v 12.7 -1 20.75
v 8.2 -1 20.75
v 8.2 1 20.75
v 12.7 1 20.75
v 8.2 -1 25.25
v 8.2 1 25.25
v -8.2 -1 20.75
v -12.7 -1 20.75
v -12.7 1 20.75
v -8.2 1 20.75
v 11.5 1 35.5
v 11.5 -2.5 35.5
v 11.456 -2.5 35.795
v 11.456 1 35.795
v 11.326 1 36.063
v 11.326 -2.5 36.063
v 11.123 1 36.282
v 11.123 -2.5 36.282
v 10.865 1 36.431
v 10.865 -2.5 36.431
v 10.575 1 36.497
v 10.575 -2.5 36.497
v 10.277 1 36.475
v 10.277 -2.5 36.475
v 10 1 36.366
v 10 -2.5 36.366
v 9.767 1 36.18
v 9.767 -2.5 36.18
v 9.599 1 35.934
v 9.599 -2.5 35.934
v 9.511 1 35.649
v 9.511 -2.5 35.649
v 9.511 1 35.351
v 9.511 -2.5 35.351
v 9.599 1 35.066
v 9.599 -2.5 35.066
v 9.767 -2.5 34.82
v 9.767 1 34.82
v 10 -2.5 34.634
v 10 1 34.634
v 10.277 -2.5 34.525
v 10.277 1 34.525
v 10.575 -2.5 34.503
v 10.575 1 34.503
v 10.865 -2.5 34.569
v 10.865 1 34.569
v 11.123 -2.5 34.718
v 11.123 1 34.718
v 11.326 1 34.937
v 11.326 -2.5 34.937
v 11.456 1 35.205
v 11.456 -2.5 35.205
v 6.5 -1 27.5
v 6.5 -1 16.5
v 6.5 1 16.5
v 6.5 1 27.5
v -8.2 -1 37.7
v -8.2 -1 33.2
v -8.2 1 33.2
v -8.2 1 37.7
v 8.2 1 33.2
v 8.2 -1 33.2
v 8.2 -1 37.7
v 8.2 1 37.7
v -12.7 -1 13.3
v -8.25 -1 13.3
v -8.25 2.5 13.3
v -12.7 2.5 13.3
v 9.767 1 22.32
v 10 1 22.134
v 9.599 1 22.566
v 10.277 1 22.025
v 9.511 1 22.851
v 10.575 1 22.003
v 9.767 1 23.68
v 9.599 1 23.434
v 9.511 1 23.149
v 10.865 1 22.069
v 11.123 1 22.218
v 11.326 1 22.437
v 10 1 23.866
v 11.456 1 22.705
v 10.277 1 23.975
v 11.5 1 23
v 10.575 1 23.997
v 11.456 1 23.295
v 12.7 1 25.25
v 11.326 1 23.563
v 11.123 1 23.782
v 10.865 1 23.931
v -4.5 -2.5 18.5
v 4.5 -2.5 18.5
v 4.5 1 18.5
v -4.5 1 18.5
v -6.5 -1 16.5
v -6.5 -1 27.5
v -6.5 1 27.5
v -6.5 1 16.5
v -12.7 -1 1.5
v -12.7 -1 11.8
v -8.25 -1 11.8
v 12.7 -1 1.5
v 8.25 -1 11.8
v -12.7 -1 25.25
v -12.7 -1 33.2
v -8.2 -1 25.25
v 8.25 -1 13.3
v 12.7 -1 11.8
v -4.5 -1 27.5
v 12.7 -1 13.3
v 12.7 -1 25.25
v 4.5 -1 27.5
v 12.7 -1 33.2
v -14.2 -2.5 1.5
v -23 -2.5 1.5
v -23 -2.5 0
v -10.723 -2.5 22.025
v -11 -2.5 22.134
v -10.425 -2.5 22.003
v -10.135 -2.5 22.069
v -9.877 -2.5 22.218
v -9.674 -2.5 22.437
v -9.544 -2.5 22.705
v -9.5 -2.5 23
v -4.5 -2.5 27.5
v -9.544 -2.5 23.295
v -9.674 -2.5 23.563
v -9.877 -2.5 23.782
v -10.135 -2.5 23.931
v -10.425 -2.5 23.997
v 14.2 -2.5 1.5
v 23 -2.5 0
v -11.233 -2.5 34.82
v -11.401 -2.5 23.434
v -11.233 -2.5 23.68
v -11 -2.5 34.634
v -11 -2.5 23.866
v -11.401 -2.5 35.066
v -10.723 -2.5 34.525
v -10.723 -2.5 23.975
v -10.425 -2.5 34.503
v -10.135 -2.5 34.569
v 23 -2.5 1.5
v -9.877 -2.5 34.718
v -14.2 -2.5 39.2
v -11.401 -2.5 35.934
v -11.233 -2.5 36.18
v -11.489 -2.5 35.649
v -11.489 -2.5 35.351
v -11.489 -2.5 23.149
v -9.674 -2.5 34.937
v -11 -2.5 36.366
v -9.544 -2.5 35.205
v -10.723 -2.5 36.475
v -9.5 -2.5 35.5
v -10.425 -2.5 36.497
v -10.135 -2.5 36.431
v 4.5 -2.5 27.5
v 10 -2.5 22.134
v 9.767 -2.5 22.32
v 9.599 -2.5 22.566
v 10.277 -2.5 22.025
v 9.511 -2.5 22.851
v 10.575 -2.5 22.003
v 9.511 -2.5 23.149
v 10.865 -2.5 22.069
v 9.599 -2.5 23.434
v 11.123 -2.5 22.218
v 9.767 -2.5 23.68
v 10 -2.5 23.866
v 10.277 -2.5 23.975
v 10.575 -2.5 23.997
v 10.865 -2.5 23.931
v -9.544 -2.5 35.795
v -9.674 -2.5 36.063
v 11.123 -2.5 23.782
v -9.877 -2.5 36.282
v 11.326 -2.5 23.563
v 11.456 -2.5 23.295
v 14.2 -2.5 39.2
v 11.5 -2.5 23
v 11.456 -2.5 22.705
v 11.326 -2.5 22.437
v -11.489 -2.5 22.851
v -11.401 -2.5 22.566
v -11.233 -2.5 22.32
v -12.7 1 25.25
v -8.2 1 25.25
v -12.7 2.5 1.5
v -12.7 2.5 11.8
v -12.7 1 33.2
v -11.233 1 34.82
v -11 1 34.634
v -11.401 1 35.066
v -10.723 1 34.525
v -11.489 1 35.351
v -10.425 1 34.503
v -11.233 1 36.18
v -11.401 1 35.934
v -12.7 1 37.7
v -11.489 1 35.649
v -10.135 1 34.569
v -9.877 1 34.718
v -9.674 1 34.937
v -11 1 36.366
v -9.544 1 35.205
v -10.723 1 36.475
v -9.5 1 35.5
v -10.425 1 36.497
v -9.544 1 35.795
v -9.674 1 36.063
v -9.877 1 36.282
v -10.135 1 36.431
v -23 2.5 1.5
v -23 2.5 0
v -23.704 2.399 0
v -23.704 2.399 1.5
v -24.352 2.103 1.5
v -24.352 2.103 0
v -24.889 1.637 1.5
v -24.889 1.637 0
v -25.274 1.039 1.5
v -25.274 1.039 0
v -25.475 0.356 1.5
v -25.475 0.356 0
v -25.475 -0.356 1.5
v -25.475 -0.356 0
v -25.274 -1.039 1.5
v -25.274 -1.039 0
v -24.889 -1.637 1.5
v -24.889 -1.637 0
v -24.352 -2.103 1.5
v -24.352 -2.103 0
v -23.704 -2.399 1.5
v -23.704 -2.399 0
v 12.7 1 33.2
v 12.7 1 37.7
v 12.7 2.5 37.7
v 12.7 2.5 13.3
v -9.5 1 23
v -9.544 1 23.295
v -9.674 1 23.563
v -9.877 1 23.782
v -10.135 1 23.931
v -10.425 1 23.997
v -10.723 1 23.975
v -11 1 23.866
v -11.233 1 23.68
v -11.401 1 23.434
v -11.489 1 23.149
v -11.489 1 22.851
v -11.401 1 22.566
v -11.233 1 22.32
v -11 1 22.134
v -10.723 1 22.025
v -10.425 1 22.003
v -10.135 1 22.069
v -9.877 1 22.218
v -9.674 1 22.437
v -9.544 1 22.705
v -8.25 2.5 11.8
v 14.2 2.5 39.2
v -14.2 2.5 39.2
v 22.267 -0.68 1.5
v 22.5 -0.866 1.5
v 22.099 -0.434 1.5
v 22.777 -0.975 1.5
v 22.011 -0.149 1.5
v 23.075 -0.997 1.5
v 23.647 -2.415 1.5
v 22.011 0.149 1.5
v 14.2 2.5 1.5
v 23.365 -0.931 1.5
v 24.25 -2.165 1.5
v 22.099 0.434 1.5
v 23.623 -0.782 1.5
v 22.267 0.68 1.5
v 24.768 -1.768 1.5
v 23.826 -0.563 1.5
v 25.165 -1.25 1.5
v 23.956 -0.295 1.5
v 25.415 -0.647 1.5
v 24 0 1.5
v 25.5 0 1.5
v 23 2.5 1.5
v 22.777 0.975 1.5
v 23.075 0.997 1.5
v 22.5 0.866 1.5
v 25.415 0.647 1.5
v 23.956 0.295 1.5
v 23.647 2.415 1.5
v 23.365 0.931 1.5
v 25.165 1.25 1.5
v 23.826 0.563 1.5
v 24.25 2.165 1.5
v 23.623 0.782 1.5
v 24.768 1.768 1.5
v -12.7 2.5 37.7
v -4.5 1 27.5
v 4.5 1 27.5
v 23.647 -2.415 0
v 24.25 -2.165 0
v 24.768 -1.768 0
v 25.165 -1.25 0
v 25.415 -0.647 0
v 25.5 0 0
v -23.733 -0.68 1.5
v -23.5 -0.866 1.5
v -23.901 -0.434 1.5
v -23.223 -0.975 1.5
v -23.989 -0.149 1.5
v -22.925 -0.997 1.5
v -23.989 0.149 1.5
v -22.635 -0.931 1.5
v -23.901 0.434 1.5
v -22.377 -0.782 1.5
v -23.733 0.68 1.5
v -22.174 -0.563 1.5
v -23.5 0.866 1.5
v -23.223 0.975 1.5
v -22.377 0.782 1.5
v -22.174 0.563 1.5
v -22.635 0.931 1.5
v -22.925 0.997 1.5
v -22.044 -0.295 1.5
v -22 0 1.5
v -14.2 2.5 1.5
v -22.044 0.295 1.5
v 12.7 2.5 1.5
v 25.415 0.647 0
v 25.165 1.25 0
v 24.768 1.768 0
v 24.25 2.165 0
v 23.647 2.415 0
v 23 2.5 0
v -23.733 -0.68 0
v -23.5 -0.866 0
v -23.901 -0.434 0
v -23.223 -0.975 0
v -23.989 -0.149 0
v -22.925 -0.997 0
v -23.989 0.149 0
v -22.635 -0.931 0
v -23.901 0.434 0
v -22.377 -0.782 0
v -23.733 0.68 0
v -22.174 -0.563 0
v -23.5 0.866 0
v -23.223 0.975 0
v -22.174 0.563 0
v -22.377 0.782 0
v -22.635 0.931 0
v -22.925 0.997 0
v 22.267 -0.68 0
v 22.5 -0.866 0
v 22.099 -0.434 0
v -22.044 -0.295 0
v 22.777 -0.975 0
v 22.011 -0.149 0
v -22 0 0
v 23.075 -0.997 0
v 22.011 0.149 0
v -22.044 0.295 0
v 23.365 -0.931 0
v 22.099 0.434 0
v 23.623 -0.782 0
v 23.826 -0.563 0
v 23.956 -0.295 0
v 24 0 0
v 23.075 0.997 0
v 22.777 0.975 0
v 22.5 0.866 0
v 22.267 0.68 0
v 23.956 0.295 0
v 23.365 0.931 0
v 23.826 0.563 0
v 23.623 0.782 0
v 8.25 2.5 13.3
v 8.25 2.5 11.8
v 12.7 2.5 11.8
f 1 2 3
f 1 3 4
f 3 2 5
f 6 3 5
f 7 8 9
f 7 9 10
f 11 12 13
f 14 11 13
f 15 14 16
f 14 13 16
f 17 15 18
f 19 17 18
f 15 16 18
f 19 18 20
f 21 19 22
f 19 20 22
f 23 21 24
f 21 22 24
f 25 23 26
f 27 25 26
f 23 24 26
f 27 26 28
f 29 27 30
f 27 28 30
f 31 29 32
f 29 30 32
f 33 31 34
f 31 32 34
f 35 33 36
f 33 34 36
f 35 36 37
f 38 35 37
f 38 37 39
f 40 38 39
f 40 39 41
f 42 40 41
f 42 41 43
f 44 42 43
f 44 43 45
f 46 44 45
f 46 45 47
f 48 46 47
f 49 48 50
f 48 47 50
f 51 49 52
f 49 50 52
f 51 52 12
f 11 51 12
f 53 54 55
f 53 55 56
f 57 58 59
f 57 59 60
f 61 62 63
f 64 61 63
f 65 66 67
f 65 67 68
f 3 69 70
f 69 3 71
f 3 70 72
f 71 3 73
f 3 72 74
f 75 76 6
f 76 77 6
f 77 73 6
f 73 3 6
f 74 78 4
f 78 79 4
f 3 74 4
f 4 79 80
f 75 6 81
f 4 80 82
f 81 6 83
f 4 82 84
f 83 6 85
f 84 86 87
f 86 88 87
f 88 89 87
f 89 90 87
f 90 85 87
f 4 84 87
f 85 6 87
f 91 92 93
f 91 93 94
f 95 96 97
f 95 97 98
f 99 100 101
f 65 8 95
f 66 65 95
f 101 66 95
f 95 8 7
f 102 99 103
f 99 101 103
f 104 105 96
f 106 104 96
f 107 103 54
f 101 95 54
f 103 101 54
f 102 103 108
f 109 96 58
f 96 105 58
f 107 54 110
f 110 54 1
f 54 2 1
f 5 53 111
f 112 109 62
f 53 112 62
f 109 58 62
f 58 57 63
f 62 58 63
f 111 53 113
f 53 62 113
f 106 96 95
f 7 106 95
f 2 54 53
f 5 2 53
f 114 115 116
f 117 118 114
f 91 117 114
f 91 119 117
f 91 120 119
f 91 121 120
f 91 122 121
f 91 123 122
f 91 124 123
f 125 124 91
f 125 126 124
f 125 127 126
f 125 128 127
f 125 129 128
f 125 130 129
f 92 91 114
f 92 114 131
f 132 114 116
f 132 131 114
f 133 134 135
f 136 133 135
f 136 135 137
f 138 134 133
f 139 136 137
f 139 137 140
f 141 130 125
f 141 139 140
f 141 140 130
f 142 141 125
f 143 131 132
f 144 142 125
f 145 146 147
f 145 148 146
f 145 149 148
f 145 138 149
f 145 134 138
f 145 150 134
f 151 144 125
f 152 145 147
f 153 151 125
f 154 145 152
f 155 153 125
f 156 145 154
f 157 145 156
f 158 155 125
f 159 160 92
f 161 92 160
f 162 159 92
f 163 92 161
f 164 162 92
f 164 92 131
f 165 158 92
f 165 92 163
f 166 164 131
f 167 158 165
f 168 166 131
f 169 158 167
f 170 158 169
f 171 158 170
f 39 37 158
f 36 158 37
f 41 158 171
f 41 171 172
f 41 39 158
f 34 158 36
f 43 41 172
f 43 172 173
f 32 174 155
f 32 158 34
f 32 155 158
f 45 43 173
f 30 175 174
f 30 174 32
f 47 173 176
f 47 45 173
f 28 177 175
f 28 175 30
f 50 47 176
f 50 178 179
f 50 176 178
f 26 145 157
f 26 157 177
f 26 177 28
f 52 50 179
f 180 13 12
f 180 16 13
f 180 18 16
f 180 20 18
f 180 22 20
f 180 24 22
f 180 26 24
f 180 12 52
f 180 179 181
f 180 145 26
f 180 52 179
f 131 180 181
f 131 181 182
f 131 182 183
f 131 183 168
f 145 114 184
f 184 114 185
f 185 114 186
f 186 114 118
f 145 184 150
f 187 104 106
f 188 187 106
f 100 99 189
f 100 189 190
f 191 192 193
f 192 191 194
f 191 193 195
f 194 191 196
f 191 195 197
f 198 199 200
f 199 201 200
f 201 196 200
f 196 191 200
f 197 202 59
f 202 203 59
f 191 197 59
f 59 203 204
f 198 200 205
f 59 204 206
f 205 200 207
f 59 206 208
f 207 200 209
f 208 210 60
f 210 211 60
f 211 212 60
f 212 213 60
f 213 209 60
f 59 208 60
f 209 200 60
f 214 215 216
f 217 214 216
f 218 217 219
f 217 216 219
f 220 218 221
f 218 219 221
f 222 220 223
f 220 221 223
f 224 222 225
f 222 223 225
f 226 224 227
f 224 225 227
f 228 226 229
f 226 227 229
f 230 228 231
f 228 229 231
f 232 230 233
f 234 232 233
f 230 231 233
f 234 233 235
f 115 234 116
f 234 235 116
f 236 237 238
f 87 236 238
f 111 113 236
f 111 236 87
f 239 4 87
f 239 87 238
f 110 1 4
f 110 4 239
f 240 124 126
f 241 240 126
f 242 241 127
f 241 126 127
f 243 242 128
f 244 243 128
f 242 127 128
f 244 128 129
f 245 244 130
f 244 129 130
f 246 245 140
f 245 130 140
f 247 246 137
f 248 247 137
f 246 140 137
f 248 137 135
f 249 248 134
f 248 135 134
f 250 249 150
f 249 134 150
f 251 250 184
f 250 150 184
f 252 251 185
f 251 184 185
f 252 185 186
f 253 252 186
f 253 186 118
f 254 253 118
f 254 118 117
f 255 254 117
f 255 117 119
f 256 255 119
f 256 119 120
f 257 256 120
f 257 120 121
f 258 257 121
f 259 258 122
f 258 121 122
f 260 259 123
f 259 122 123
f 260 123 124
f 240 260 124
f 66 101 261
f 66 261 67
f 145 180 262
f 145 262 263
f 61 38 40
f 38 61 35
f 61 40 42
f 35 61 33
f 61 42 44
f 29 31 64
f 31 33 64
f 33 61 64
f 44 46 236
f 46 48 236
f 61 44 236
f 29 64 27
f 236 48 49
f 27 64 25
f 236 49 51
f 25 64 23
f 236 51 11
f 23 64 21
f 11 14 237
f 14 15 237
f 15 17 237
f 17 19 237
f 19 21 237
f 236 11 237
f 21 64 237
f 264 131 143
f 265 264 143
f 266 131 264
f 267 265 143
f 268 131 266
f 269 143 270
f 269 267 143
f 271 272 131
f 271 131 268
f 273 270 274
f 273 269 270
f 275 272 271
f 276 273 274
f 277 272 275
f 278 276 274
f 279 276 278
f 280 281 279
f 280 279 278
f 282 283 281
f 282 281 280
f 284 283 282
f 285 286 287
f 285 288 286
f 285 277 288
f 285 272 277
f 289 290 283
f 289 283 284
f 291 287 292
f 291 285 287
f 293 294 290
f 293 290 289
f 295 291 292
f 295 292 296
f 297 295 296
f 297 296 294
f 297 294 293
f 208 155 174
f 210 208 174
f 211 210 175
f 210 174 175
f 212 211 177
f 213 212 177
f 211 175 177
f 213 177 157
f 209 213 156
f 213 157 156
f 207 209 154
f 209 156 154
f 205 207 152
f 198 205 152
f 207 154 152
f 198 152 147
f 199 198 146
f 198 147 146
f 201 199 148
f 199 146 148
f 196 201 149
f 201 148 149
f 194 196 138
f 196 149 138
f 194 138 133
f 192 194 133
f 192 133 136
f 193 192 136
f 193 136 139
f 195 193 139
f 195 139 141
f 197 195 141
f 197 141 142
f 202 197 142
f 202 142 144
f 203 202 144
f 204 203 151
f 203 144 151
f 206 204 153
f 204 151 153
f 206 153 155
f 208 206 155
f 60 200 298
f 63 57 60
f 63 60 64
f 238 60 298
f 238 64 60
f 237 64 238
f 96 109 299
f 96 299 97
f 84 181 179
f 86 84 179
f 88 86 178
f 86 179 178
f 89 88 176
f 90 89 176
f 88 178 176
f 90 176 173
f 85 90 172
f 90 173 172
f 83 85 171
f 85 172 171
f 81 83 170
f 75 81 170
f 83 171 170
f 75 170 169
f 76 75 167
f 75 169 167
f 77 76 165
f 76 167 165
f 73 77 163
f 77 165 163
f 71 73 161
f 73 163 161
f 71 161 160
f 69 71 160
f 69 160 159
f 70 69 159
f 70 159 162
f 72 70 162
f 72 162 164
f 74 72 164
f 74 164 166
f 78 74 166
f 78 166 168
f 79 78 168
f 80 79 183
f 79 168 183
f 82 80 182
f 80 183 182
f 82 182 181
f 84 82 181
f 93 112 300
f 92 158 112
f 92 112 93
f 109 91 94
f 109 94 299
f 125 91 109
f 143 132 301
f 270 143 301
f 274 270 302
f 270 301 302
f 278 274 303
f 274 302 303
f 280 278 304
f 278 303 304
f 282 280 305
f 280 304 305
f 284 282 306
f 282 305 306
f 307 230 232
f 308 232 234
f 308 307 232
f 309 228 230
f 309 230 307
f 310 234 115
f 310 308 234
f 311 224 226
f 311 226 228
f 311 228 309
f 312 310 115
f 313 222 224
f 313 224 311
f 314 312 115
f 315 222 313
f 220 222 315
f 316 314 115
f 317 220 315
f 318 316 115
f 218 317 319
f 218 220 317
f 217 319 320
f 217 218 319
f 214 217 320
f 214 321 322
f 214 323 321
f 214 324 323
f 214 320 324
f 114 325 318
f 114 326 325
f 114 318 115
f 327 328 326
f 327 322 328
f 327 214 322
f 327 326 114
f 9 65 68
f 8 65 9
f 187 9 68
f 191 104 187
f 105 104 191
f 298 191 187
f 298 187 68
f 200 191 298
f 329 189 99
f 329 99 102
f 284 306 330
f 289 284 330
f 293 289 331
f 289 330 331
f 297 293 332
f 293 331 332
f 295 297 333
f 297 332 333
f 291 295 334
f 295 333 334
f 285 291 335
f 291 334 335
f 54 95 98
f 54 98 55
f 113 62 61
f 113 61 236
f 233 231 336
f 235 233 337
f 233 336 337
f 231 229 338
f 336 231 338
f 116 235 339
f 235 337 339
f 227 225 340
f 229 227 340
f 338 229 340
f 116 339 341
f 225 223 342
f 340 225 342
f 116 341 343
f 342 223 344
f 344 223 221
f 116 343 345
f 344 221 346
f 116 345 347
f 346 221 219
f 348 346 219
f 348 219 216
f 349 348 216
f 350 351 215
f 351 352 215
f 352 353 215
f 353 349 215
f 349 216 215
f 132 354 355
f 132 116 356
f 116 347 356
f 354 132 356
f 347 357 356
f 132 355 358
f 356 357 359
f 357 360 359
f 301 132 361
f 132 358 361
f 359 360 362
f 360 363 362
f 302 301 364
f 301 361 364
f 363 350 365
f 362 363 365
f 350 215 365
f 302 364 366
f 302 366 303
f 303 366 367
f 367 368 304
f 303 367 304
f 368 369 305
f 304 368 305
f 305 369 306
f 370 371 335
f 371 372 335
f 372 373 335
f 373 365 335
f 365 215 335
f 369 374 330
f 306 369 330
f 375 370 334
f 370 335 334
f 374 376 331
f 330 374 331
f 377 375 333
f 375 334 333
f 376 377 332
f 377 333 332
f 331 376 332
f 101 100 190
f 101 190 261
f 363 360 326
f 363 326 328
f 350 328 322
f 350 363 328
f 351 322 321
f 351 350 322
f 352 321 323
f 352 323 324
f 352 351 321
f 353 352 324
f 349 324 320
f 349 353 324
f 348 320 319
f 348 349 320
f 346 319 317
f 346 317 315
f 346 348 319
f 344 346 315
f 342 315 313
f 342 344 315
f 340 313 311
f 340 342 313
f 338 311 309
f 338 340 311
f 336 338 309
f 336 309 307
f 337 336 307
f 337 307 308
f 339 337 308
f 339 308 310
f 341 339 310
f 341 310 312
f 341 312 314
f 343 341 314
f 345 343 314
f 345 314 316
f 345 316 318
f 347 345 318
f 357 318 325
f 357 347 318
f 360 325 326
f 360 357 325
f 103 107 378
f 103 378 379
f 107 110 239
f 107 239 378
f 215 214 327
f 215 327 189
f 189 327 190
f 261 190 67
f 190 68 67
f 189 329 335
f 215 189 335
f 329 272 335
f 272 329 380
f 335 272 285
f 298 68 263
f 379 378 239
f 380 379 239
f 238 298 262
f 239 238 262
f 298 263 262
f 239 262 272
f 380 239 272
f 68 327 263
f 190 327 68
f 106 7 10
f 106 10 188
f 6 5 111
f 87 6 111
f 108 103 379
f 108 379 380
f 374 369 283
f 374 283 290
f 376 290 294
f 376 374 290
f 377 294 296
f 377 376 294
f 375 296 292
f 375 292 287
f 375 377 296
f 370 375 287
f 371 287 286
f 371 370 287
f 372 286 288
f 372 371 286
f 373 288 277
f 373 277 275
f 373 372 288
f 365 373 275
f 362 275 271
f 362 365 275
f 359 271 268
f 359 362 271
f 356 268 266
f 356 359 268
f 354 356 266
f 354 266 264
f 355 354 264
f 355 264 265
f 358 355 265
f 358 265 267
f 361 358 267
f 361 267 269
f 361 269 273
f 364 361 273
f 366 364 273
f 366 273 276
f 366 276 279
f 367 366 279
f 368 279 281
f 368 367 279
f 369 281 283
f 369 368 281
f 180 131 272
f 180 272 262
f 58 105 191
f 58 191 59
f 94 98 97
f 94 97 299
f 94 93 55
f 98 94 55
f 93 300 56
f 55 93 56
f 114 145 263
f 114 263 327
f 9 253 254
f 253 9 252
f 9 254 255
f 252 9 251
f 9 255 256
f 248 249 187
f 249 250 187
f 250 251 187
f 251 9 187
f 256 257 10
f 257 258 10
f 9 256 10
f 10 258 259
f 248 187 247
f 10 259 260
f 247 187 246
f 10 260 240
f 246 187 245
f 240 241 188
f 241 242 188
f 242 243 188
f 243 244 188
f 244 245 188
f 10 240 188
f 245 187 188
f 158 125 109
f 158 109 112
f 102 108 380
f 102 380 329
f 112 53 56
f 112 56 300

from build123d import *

# Parameters (mm, degrees)
F0_R     = 1
F1_DEPTH = 1.5
F3_DEPTH = 1.5
F4_DEPTH = 5
F2_W     = 4.5
F2_H     = 4.5
F2_R     = 1
F5_DEPTH = 3.5


with BuildPart() as f1:
    # F0 (on Top) → F1 (new body)
    with BuildSketch(Plane.XY):
        with BuildLine():
            ThreePointArc((-20.5, 0), (-21.232233047, 1.767766953), (-23, 2.5))
            ThreePointArc((-23, 2.5), (-25.5, 0), (-23, -2.5))
            ThreePointArc((-23, -2.5), (-21.232233047, -1.767766953), (-20.5, 0))
        make_face()
        with Locations((-23, 0)):
            Circle(F0_R, mode=Mode.SUBTRACT)
        with BuildLine():
            Line((23, 2.5), (-23, 2.5))
            ThreePointArc((-23, 2.5), (-21.232233047, 1.767766953), (-20.5, 0))
            ThreePointArc((-20.5, 0), (-21.232233047, -1.767766953), (-23, -2.5))
            Line((-23, -2.5), (23, -2.5))
            ThreePointArc((23, -2.5), (20.5, 0), (23, 2.5))
        make_face()
        with BuildLine():
            ThreePointArc((25.5, 0), (24.767766953, 1.767766953), (23, 2.5))
            ThreePointArc((23, 2.5), (20.5, 0), (23, -2.5))
            ThreePointArc((23, -2.5), (24.767766953, -1.767766953), (25.5, 0))
        make_face()
        with Locations((23, 0)):
            Circle(F0_R, mode=Mode.SUBTRACT)
    extrude(amount=F1_DEPTH)

    # F2 (on face) → F3 (join)
    with BuildSketch(Plane.XZ.offset(2.5)):
        Polygon((8.2, 37.7), (-8.2, 37.7), (-8.2, 33.2), (-12.7, 33.2), (-12.7, 25.25), (-8.2, 25.25), (-8.2, 20.75), (-12.7, 20.75), (-12.7, 13.3), (-8.25, 13.3), (-8.25, 11.8), (-12.7, 11.8), (-12.7, 1.5), (12.7, 1.5), (12.7, 11.8), (8.25, 11.8), (8.25, 13.3), (12.7, 13.3), (12.7, 20.75), (8.2, 20.75), (8.2, 25.25), (12.7, 25.25), (12.7, 33.2), (8.2, 33.2), align=None)
        Polygon((-6.5, 27.5), (-4.5, 27.5), (4.5, 27.5), (6.5, 27.5), (6.5, 16.5), (-6.5, 16.5), align=None, mode=Mode.SUBTRACT)
    extrude(amount=-F3_DEPTH)

    # F2 (on face) → F4 (join)
    with BuildSketch(Plane.XZ.offset(2.5)):
        Polygon((-12.7, 33.2), (-12.7, 37.7), (-8.2, 37.7), (8.2, 37.7), (12.7, 37.7), (12.7, 33.2), (12.7, 25.25), (12.7, 20.75), (12.7, 13.3), (8.25, 13.3), (8.25, 11.8), (12.7, 11.8), (12.7, 1.5), (14.2, 1.5), (14.2, 39.2), (-14.2, 39.2), (-14.2, 1.5), (-12.7, 1.5), (-12.7, 11.8), (-8.25, 11.8), (-8.25, 13.3), (-12.7, 13.3), (-12.7, 20.75), (-12.7, 25.25), align=None)
    extrude(amount=-F4_DEPTH)

    # F2 (on face) → F5 (join)
    with BuildSketch(Plane.XZ.offset(2.5)):
        with Locations((10.45, 35.45)):
            Rectangle(F2_W, F2_H)
        with Locations((10.5, 35.5)):
            Circle(F2_R, mode=Mode.SUBTRACT)
        with Locations((10.45, 23)):
            Rectangle(F2_W, F2_H)
        with Locations((10.5, 23)):
            Circle(F2_R, mode=Mode.SUBTRACT)
        Polygon((-4.5, 18.5), (-4.5, 27.5), (-6.5, 27.5), (-6.5, 16.5), (6.5, 16.5), (6.5, 27.5), (4.5, 27.5), (4.5, 18.5), align=None)
        with Locations((-10.45, 35.45)):
            Rectangle(F2_W, F2_H)
        with Locations((-10.5, 35.5)):
            Circle(F2_R, mode=Mode.SUBTRACT)
        with Locations((-10.45, 23)):
            Rectangle(F2_W, F2_H)
        with Locations((-10.5, 23)):
            Circle(F2_R, mode=Mode.SUBTRACT)
    extrude(amount=-F5_DEPTH)


solid = f1.part
